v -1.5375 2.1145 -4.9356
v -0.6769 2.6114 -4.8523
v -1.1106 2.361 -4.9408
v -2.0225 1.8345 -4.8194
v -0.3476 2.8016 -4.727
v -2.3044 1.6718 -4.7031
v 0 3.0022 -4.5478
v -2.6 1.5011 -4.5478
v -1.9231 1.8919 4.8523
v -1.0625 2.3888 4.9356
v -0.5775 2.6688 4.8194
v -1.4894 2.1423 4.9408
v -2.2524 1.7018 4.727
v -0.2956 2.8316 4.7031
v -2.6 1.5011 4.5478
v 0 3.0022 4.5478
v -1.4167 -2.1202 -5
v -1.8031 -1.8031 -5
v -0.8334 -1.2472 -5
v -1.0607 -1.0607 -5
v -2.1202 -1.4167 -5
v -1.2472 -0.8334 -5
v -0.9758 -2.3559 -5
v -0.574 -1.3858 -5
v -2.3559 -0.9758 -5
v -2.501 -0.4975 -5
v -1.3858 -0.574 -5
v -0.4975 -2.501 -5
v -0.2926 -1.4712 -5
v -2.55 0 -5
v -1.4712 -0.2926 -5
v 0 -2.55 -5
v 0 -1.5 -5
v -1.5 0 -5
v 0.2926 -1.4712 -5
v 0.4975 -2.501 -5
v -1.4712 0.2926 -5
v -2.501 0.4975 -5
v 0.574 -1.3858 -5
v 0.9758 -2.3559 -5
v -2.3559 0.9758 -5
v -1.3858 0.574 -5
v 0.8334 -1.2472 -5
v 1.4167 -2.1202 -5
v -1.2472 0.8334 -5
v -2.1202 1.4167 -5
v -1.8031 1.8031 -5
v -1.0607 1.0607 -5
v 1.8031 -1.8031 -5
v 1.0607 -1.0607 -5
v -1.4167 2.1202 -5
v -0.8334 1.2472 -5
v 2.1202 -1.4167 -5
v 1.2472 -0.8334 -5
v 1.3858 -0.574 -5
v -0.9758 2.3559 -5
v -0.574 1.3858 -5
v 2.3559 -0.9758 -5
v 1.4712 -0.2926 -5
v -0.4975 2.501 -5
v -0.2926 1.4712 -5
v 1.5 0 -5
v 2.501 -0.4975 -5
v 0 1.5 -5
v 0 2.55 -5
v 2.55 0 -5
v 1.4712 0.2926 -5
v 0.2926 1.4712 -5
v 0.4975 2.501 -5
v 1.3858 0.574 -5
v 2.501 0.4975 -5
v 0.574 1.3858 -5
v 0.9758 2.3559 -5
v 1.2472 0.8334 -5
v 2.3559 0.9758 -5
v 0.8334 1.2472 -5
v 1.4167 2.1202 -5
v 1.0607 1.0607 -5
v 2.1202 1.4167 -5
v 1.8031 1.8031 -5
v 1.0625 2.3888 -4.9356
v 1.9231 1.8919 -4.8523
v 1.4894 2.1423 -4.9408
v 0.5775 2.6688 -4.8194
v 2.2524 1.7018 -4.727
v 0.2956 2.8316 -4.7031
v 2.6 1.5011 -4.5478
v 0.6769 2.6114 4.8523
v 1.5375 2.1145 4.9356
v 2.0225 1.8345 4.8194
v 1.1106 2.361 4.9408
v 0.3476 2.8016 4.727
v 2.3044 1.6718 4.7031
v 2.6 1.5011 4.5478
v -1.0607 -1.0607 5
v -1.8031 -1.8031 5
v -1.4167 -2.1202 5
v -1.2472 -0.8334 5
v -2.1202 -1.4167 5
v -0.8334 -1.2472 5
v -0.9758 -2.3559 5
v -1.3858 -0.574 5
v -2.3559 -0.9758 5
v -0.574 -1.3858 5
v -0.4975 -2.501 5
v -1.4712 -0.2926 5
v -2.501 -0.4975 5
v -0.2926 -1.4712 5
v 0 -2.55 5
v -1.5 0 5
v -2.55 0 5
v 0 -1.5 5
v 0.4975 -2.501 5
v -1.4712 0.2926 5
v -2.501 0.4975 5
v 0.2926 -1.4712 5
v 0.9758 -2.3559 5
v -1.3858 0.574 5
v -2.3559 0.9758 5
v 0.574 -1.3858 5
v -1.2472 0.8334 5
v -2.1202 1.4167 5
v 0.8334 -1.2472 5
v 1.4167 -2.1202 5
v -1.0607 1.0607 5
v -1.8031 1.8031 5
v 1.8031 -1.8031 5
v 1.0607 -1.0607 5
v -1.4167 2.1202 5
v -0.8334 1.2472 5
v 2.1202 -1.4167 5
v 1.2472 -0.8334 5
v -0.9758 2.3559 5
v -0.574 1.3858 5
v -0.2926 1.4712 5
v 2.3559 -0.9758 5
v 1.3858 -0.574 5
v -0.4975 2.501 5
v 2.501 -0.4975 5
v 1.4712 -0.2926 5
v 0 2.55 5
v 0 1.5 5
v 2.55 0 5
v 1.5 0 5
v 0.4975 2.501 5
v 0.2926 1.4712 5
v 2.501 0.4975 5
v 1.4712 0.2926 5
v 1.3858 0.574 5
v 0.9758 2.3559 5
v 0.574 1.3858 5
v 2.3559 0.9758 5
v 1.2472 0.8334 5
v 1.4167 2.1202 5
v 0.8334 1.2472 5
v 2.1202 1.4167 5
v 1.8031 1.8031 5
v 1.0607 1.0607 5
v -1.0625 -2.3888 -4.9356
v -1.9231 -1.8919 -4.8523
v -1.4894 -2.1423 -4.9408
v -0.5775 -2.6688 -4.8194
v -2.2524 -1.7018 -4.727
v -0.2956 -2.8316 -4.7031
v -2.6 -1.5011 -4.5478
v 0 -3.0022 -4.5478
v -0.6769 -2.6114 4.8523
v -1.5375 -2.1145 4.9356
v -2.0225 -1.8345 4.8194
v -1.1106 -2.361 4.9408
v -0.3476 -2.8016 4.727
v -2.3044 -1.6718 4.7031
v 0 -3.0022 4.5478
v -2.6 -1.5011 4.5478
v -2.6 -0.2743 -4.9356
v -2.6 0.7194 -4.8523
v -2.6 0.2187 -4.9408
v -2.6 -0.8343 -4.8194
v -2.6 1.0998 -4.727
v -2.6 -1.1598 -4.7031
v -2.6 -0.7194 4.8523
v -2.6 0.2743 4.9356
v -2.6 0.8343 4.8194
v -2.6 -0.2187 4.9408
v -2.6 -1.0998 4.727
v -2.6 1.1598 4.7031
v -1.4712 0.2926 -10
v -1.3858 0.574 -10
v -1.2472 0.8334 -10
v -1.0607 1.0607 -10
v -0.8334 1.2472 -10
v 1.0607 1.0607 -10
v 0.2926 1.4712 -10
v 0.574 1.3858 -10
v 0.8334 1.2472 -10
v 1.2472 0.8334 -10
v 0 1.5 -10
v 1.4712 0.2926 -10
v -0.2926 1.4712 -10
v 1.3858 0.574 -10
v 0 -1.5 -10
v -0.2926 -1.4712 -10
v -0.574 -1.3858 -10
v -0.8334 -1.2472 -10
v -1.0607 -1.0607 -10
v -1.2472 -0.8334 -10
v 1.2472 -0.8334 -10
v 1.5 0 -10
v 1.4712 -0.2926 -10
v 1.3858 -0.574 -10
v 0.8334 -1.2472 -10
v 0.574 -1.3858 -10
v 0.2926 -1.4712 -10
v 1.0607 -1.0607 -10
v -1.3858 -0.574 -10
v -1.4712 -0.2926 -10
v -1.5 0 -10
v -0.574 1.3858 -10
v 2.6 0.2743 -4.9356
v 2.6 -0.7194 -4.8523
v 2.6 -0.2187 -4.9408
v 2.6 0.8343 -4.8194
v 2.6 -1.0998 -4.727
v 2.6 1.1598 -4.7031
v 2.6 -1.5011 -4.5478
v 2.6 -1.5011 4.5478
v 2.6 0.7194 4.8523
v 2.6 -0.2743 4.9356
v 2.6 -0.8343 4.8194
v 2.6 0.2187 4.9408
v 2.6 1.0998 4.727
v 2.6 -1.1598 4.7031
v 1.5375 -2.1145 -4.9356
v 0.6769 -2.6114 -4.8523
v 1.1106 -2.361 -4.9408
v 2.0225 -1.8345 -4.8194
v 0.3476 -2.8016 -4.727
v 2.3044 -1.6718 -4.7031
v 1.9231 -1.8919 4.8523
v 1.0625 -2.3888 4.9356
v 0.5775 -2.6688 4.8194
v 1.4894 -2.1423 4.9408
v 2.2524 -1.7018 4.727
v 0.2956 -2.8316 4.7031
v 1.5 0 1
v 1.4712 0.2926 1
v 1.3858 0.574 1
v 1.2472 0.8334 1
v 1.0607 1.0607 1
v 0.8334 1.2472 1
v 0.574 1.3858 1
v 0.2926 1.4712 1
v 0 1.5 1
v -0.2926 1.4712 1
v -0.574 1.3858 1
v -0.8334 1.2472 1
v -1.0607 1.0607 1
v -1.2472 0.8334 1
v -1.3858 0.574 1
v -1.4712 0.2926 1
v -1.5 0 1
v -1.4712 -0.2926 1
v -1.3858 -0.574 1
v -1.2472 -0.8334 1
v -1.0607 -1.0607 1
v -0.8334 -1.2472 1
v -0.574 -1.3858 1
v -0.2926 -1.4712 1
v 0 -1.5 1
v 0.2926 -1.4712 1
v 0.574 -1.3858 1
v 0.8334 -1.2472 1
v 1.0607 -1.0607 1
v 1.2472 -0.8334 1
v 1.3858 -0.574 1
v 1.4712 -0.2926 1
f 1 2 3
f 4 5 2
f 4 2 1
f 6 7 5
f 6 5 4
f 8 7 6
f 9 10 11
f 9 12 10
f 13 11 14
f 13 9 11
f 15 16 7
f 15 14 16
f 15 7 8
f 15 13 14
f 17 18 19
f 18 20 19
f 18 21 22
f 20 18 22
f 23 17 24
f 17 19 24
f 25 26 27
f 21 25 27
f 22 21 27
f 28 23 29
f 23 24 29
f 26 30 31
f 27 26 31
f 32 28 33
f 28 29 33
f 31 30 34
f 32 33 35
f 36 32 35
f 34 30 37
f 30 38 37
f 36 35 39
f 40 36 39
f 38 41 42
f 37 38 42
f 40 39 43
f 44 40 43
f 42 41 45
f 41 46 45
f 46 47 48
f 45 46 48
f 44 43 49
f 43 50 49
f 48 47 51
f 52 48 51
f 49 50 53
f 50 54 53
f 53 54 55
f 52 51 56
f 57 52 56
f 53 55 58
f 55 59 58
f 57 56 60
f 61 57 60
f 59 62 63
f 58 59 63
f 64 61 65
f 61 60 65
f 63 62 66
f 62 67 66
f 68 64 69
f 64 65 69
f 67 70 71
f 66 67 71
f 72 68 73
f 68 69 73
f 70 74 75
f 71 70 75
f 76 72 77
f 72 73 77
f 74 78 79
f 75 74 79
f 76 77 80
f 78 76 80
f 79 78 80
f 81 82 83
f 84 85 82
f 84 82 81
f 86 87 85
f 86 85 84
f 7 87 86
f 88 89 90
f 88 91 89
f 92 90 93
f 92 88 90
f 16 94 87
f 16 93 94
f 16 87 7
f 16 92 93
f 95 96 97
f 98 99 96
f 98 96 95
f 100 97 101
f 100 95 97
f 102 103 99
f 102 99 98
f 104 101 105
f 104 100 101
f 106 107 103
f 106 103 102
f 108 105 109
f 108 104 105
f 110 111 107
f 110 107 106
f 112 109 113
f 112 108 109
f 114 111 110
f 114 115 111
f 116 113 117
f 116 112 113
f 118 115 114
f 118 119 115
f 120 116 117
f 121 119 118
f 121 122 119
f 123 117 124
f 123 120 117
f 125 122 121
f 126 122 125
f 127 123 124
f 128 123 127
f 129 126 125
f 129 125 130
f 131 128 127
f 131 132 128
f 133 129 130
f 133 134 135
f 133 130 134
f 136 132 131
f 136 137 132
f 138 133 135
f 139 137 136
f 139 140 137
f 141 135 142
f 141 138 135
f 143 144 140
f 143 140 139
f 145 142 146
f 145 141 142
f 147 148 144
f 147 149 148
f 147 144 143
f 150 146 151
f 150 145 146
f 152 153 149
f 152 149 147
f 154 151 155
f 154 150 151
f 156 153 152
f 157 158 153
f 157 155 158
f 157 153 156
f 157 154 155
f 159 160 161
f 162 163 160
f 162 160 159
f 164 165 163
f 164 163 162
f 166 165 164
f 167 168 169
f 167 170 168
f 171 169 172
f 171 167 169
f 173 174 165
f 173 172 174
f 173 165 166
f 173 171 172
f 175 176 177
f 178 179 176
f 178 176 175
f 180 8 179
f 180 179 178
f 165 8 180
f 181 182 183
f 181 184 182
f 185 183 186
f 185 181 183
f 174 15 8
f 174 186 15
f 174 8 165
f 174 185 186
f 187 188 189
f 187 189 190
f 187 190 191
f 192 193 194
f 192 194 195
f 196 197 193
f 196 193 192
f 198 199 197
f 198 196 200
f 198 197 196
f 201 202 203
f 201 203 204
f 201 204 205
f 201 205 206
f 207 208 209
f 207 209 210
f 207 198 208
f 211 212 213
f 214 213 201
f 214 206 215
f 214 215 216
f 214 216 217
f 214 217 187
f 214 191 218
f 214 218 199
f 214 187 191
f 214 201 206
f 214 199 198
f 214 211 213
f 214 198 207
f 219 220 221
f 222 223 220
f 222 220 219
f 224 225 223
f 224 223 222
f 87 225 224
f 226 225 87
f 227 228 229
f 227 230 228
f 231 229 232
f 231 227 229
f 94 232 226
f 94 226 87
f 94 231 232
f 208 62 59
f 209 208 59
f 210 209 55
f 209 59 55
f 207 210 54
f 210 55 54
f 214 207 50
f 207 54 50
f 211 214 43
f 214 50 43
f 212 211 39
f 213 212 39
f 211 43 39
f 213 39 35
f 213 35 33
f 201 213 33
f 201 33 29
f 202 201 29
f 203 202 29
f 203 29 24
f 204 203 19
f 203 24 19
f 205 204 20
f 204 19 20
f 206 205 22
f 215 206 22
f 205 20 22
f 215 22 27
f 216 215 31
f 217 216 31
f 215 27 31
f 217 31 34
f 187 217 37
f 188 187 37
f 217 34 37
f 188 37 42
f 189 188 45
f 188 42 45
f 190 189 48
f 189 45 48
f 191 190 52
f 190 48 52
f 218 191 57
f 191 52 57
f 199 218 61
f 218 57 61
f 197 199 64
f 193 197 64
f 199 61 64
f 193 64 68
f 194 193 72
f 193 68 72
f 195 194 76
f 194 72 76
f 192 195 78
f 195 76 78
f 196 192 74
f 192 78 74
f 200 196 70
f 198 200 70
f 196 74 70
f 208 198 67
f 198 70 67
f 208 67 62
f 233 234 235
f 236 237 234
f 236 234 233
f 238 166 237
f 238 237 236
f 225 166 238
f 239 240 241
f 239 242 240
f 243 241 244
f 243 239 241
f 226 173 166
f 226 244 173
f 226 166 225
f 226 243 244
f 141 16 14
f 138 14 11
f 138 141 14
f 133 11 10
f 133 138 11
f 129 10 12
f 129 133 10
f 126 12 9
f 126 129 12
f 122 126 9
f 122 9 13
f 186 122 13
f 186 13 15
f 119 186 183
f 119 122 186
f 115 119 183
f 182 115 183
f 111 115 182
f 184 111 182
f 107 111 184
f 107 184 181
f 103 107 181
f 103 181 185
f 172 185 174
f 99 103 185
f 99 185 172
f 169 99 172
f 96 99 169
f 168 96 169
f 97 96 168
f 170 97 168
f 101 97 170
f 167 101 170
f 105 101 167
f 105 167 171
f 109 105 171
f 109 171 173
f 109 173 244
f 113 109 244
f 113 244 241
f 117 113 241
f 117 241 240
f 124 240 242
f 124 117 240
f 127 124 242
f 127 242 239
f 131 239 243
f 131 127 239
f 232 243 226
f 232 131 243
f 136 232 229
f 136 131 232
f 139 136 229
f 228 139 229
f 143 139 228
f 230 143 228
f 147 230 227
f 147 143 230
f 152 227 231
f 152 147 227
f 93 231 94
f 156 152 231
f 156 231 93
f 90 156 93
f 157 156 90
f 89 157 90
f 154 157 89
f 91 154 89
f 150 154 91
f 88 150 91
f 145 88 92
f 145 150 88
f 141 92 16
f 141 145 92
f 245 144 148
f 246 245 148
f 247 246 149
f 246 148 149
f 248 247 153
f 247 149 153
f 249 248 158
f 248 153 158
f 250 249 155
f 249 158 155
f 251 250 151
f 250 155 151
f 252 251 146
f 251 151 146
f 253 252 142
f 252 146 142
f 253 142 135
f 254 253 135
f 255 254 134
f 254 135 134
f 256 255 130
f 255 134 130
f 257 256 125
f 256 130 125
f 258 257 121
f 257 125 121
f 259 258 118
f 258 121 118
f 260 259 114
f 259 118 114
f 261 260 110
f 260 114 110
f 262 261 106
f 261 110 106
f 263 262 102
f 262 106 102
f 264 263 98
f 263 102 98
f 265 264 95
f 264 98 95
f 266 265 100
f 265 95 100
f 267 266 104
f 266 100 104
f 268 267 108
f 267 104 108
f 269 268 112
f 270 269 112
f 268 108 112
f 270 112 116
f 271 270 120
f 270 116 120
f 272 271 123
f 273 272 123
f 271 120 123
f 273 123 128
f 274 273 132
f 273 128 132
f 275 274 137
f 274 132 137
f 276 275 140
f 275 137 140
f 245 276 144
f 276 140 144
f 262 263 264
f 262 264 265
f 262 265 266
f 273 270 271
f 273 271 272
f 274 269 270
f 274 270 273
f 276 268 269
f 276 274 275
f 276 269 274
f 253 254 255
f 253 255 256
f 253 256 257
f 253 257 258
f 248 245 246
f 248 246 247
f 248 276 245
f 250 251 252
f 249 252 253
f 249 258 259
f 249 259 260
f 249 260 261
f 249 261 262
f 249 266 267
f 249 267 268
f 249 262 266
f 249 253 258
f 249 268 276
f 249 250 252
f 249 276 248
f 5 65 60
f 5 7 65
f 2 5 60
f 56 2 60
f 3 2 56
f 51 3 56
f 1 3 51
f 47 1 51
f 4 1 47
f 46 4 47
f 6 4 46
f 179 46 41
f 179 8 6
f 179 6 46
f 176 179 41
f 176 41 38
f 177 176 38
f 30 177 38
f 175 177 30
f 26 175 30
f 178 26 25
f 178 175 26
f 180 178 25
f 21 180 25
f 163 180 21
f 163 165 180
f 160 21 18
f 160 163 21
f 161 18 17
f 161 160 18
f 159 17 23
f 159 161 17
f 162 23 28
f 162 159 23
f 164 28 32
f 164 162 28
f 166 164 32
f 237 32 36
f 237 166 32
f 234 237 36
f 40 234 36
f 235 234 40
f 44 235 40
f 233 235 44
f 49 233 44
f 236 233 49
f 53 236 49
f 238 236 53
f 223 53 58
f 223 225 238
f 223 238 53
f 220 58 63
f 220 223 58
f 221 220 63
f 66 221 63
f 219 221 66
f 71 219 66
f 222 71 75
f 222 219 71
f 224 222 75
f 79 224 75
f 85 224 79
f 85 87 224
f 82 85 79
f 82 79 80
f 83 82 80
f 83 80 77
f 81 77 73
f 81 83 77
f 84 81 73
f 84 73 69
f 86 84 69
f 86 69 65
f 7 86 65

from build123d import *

# Parameters (mm, degrees)
PAD_DEPTH    = 5
SKETCH001_R  = 1.5
POCKET_DEPTH = 4
SKETCH004_R  = 1.5
PAD001_DEPTH = 5


with BuildPart() as part:
    # Sketch → Pad (new body, symmetric)
    with BuildSketch(Plane.XY):
        Polygon((2.6, 1.501111), (0, 3.002221), (-2.6, 1.501111), (-2.6, -1.501111), (0, -3.002221), (2.6, -1.501111), align=None)
    extrude(amount=PAD_DEPTH, both=True)

    # Sketch001 (on Face8 of Pad) → Pocket (cut)
    with BuildSketch(Plane.XY.offset(5)):
        Circle(SKETCH001_R)
    extrude(amount=-POCKET_DEPTH, mode=Mode.SUBTRACT)

    # Sketch004 (on Face4 of Pocket) → Pad001 (join)
    with BuildSketch(Plane(origin=(0, 0, -5), x_dir=(1, 0, 0), z_dir=(0, 0, -1))):
        Circle(SKETCH004_R)
    extrude(amount=PAD001_DEPTH)

    # Sketch005 → Groove (revolve, cut)
    with BuildSketch(Plane.YZ):
        Polygon((1.8, 5.75), (5.8, 5.75), (5.8, -5.75), (1.8, -5.75), (4.05, -3.5), (4.05, 3.5), align=None)
    revolve(axis=Axis((0, 0, 0), (0, 0, 1)), mode=Mode.SUBTRACT)


solid = part.part
